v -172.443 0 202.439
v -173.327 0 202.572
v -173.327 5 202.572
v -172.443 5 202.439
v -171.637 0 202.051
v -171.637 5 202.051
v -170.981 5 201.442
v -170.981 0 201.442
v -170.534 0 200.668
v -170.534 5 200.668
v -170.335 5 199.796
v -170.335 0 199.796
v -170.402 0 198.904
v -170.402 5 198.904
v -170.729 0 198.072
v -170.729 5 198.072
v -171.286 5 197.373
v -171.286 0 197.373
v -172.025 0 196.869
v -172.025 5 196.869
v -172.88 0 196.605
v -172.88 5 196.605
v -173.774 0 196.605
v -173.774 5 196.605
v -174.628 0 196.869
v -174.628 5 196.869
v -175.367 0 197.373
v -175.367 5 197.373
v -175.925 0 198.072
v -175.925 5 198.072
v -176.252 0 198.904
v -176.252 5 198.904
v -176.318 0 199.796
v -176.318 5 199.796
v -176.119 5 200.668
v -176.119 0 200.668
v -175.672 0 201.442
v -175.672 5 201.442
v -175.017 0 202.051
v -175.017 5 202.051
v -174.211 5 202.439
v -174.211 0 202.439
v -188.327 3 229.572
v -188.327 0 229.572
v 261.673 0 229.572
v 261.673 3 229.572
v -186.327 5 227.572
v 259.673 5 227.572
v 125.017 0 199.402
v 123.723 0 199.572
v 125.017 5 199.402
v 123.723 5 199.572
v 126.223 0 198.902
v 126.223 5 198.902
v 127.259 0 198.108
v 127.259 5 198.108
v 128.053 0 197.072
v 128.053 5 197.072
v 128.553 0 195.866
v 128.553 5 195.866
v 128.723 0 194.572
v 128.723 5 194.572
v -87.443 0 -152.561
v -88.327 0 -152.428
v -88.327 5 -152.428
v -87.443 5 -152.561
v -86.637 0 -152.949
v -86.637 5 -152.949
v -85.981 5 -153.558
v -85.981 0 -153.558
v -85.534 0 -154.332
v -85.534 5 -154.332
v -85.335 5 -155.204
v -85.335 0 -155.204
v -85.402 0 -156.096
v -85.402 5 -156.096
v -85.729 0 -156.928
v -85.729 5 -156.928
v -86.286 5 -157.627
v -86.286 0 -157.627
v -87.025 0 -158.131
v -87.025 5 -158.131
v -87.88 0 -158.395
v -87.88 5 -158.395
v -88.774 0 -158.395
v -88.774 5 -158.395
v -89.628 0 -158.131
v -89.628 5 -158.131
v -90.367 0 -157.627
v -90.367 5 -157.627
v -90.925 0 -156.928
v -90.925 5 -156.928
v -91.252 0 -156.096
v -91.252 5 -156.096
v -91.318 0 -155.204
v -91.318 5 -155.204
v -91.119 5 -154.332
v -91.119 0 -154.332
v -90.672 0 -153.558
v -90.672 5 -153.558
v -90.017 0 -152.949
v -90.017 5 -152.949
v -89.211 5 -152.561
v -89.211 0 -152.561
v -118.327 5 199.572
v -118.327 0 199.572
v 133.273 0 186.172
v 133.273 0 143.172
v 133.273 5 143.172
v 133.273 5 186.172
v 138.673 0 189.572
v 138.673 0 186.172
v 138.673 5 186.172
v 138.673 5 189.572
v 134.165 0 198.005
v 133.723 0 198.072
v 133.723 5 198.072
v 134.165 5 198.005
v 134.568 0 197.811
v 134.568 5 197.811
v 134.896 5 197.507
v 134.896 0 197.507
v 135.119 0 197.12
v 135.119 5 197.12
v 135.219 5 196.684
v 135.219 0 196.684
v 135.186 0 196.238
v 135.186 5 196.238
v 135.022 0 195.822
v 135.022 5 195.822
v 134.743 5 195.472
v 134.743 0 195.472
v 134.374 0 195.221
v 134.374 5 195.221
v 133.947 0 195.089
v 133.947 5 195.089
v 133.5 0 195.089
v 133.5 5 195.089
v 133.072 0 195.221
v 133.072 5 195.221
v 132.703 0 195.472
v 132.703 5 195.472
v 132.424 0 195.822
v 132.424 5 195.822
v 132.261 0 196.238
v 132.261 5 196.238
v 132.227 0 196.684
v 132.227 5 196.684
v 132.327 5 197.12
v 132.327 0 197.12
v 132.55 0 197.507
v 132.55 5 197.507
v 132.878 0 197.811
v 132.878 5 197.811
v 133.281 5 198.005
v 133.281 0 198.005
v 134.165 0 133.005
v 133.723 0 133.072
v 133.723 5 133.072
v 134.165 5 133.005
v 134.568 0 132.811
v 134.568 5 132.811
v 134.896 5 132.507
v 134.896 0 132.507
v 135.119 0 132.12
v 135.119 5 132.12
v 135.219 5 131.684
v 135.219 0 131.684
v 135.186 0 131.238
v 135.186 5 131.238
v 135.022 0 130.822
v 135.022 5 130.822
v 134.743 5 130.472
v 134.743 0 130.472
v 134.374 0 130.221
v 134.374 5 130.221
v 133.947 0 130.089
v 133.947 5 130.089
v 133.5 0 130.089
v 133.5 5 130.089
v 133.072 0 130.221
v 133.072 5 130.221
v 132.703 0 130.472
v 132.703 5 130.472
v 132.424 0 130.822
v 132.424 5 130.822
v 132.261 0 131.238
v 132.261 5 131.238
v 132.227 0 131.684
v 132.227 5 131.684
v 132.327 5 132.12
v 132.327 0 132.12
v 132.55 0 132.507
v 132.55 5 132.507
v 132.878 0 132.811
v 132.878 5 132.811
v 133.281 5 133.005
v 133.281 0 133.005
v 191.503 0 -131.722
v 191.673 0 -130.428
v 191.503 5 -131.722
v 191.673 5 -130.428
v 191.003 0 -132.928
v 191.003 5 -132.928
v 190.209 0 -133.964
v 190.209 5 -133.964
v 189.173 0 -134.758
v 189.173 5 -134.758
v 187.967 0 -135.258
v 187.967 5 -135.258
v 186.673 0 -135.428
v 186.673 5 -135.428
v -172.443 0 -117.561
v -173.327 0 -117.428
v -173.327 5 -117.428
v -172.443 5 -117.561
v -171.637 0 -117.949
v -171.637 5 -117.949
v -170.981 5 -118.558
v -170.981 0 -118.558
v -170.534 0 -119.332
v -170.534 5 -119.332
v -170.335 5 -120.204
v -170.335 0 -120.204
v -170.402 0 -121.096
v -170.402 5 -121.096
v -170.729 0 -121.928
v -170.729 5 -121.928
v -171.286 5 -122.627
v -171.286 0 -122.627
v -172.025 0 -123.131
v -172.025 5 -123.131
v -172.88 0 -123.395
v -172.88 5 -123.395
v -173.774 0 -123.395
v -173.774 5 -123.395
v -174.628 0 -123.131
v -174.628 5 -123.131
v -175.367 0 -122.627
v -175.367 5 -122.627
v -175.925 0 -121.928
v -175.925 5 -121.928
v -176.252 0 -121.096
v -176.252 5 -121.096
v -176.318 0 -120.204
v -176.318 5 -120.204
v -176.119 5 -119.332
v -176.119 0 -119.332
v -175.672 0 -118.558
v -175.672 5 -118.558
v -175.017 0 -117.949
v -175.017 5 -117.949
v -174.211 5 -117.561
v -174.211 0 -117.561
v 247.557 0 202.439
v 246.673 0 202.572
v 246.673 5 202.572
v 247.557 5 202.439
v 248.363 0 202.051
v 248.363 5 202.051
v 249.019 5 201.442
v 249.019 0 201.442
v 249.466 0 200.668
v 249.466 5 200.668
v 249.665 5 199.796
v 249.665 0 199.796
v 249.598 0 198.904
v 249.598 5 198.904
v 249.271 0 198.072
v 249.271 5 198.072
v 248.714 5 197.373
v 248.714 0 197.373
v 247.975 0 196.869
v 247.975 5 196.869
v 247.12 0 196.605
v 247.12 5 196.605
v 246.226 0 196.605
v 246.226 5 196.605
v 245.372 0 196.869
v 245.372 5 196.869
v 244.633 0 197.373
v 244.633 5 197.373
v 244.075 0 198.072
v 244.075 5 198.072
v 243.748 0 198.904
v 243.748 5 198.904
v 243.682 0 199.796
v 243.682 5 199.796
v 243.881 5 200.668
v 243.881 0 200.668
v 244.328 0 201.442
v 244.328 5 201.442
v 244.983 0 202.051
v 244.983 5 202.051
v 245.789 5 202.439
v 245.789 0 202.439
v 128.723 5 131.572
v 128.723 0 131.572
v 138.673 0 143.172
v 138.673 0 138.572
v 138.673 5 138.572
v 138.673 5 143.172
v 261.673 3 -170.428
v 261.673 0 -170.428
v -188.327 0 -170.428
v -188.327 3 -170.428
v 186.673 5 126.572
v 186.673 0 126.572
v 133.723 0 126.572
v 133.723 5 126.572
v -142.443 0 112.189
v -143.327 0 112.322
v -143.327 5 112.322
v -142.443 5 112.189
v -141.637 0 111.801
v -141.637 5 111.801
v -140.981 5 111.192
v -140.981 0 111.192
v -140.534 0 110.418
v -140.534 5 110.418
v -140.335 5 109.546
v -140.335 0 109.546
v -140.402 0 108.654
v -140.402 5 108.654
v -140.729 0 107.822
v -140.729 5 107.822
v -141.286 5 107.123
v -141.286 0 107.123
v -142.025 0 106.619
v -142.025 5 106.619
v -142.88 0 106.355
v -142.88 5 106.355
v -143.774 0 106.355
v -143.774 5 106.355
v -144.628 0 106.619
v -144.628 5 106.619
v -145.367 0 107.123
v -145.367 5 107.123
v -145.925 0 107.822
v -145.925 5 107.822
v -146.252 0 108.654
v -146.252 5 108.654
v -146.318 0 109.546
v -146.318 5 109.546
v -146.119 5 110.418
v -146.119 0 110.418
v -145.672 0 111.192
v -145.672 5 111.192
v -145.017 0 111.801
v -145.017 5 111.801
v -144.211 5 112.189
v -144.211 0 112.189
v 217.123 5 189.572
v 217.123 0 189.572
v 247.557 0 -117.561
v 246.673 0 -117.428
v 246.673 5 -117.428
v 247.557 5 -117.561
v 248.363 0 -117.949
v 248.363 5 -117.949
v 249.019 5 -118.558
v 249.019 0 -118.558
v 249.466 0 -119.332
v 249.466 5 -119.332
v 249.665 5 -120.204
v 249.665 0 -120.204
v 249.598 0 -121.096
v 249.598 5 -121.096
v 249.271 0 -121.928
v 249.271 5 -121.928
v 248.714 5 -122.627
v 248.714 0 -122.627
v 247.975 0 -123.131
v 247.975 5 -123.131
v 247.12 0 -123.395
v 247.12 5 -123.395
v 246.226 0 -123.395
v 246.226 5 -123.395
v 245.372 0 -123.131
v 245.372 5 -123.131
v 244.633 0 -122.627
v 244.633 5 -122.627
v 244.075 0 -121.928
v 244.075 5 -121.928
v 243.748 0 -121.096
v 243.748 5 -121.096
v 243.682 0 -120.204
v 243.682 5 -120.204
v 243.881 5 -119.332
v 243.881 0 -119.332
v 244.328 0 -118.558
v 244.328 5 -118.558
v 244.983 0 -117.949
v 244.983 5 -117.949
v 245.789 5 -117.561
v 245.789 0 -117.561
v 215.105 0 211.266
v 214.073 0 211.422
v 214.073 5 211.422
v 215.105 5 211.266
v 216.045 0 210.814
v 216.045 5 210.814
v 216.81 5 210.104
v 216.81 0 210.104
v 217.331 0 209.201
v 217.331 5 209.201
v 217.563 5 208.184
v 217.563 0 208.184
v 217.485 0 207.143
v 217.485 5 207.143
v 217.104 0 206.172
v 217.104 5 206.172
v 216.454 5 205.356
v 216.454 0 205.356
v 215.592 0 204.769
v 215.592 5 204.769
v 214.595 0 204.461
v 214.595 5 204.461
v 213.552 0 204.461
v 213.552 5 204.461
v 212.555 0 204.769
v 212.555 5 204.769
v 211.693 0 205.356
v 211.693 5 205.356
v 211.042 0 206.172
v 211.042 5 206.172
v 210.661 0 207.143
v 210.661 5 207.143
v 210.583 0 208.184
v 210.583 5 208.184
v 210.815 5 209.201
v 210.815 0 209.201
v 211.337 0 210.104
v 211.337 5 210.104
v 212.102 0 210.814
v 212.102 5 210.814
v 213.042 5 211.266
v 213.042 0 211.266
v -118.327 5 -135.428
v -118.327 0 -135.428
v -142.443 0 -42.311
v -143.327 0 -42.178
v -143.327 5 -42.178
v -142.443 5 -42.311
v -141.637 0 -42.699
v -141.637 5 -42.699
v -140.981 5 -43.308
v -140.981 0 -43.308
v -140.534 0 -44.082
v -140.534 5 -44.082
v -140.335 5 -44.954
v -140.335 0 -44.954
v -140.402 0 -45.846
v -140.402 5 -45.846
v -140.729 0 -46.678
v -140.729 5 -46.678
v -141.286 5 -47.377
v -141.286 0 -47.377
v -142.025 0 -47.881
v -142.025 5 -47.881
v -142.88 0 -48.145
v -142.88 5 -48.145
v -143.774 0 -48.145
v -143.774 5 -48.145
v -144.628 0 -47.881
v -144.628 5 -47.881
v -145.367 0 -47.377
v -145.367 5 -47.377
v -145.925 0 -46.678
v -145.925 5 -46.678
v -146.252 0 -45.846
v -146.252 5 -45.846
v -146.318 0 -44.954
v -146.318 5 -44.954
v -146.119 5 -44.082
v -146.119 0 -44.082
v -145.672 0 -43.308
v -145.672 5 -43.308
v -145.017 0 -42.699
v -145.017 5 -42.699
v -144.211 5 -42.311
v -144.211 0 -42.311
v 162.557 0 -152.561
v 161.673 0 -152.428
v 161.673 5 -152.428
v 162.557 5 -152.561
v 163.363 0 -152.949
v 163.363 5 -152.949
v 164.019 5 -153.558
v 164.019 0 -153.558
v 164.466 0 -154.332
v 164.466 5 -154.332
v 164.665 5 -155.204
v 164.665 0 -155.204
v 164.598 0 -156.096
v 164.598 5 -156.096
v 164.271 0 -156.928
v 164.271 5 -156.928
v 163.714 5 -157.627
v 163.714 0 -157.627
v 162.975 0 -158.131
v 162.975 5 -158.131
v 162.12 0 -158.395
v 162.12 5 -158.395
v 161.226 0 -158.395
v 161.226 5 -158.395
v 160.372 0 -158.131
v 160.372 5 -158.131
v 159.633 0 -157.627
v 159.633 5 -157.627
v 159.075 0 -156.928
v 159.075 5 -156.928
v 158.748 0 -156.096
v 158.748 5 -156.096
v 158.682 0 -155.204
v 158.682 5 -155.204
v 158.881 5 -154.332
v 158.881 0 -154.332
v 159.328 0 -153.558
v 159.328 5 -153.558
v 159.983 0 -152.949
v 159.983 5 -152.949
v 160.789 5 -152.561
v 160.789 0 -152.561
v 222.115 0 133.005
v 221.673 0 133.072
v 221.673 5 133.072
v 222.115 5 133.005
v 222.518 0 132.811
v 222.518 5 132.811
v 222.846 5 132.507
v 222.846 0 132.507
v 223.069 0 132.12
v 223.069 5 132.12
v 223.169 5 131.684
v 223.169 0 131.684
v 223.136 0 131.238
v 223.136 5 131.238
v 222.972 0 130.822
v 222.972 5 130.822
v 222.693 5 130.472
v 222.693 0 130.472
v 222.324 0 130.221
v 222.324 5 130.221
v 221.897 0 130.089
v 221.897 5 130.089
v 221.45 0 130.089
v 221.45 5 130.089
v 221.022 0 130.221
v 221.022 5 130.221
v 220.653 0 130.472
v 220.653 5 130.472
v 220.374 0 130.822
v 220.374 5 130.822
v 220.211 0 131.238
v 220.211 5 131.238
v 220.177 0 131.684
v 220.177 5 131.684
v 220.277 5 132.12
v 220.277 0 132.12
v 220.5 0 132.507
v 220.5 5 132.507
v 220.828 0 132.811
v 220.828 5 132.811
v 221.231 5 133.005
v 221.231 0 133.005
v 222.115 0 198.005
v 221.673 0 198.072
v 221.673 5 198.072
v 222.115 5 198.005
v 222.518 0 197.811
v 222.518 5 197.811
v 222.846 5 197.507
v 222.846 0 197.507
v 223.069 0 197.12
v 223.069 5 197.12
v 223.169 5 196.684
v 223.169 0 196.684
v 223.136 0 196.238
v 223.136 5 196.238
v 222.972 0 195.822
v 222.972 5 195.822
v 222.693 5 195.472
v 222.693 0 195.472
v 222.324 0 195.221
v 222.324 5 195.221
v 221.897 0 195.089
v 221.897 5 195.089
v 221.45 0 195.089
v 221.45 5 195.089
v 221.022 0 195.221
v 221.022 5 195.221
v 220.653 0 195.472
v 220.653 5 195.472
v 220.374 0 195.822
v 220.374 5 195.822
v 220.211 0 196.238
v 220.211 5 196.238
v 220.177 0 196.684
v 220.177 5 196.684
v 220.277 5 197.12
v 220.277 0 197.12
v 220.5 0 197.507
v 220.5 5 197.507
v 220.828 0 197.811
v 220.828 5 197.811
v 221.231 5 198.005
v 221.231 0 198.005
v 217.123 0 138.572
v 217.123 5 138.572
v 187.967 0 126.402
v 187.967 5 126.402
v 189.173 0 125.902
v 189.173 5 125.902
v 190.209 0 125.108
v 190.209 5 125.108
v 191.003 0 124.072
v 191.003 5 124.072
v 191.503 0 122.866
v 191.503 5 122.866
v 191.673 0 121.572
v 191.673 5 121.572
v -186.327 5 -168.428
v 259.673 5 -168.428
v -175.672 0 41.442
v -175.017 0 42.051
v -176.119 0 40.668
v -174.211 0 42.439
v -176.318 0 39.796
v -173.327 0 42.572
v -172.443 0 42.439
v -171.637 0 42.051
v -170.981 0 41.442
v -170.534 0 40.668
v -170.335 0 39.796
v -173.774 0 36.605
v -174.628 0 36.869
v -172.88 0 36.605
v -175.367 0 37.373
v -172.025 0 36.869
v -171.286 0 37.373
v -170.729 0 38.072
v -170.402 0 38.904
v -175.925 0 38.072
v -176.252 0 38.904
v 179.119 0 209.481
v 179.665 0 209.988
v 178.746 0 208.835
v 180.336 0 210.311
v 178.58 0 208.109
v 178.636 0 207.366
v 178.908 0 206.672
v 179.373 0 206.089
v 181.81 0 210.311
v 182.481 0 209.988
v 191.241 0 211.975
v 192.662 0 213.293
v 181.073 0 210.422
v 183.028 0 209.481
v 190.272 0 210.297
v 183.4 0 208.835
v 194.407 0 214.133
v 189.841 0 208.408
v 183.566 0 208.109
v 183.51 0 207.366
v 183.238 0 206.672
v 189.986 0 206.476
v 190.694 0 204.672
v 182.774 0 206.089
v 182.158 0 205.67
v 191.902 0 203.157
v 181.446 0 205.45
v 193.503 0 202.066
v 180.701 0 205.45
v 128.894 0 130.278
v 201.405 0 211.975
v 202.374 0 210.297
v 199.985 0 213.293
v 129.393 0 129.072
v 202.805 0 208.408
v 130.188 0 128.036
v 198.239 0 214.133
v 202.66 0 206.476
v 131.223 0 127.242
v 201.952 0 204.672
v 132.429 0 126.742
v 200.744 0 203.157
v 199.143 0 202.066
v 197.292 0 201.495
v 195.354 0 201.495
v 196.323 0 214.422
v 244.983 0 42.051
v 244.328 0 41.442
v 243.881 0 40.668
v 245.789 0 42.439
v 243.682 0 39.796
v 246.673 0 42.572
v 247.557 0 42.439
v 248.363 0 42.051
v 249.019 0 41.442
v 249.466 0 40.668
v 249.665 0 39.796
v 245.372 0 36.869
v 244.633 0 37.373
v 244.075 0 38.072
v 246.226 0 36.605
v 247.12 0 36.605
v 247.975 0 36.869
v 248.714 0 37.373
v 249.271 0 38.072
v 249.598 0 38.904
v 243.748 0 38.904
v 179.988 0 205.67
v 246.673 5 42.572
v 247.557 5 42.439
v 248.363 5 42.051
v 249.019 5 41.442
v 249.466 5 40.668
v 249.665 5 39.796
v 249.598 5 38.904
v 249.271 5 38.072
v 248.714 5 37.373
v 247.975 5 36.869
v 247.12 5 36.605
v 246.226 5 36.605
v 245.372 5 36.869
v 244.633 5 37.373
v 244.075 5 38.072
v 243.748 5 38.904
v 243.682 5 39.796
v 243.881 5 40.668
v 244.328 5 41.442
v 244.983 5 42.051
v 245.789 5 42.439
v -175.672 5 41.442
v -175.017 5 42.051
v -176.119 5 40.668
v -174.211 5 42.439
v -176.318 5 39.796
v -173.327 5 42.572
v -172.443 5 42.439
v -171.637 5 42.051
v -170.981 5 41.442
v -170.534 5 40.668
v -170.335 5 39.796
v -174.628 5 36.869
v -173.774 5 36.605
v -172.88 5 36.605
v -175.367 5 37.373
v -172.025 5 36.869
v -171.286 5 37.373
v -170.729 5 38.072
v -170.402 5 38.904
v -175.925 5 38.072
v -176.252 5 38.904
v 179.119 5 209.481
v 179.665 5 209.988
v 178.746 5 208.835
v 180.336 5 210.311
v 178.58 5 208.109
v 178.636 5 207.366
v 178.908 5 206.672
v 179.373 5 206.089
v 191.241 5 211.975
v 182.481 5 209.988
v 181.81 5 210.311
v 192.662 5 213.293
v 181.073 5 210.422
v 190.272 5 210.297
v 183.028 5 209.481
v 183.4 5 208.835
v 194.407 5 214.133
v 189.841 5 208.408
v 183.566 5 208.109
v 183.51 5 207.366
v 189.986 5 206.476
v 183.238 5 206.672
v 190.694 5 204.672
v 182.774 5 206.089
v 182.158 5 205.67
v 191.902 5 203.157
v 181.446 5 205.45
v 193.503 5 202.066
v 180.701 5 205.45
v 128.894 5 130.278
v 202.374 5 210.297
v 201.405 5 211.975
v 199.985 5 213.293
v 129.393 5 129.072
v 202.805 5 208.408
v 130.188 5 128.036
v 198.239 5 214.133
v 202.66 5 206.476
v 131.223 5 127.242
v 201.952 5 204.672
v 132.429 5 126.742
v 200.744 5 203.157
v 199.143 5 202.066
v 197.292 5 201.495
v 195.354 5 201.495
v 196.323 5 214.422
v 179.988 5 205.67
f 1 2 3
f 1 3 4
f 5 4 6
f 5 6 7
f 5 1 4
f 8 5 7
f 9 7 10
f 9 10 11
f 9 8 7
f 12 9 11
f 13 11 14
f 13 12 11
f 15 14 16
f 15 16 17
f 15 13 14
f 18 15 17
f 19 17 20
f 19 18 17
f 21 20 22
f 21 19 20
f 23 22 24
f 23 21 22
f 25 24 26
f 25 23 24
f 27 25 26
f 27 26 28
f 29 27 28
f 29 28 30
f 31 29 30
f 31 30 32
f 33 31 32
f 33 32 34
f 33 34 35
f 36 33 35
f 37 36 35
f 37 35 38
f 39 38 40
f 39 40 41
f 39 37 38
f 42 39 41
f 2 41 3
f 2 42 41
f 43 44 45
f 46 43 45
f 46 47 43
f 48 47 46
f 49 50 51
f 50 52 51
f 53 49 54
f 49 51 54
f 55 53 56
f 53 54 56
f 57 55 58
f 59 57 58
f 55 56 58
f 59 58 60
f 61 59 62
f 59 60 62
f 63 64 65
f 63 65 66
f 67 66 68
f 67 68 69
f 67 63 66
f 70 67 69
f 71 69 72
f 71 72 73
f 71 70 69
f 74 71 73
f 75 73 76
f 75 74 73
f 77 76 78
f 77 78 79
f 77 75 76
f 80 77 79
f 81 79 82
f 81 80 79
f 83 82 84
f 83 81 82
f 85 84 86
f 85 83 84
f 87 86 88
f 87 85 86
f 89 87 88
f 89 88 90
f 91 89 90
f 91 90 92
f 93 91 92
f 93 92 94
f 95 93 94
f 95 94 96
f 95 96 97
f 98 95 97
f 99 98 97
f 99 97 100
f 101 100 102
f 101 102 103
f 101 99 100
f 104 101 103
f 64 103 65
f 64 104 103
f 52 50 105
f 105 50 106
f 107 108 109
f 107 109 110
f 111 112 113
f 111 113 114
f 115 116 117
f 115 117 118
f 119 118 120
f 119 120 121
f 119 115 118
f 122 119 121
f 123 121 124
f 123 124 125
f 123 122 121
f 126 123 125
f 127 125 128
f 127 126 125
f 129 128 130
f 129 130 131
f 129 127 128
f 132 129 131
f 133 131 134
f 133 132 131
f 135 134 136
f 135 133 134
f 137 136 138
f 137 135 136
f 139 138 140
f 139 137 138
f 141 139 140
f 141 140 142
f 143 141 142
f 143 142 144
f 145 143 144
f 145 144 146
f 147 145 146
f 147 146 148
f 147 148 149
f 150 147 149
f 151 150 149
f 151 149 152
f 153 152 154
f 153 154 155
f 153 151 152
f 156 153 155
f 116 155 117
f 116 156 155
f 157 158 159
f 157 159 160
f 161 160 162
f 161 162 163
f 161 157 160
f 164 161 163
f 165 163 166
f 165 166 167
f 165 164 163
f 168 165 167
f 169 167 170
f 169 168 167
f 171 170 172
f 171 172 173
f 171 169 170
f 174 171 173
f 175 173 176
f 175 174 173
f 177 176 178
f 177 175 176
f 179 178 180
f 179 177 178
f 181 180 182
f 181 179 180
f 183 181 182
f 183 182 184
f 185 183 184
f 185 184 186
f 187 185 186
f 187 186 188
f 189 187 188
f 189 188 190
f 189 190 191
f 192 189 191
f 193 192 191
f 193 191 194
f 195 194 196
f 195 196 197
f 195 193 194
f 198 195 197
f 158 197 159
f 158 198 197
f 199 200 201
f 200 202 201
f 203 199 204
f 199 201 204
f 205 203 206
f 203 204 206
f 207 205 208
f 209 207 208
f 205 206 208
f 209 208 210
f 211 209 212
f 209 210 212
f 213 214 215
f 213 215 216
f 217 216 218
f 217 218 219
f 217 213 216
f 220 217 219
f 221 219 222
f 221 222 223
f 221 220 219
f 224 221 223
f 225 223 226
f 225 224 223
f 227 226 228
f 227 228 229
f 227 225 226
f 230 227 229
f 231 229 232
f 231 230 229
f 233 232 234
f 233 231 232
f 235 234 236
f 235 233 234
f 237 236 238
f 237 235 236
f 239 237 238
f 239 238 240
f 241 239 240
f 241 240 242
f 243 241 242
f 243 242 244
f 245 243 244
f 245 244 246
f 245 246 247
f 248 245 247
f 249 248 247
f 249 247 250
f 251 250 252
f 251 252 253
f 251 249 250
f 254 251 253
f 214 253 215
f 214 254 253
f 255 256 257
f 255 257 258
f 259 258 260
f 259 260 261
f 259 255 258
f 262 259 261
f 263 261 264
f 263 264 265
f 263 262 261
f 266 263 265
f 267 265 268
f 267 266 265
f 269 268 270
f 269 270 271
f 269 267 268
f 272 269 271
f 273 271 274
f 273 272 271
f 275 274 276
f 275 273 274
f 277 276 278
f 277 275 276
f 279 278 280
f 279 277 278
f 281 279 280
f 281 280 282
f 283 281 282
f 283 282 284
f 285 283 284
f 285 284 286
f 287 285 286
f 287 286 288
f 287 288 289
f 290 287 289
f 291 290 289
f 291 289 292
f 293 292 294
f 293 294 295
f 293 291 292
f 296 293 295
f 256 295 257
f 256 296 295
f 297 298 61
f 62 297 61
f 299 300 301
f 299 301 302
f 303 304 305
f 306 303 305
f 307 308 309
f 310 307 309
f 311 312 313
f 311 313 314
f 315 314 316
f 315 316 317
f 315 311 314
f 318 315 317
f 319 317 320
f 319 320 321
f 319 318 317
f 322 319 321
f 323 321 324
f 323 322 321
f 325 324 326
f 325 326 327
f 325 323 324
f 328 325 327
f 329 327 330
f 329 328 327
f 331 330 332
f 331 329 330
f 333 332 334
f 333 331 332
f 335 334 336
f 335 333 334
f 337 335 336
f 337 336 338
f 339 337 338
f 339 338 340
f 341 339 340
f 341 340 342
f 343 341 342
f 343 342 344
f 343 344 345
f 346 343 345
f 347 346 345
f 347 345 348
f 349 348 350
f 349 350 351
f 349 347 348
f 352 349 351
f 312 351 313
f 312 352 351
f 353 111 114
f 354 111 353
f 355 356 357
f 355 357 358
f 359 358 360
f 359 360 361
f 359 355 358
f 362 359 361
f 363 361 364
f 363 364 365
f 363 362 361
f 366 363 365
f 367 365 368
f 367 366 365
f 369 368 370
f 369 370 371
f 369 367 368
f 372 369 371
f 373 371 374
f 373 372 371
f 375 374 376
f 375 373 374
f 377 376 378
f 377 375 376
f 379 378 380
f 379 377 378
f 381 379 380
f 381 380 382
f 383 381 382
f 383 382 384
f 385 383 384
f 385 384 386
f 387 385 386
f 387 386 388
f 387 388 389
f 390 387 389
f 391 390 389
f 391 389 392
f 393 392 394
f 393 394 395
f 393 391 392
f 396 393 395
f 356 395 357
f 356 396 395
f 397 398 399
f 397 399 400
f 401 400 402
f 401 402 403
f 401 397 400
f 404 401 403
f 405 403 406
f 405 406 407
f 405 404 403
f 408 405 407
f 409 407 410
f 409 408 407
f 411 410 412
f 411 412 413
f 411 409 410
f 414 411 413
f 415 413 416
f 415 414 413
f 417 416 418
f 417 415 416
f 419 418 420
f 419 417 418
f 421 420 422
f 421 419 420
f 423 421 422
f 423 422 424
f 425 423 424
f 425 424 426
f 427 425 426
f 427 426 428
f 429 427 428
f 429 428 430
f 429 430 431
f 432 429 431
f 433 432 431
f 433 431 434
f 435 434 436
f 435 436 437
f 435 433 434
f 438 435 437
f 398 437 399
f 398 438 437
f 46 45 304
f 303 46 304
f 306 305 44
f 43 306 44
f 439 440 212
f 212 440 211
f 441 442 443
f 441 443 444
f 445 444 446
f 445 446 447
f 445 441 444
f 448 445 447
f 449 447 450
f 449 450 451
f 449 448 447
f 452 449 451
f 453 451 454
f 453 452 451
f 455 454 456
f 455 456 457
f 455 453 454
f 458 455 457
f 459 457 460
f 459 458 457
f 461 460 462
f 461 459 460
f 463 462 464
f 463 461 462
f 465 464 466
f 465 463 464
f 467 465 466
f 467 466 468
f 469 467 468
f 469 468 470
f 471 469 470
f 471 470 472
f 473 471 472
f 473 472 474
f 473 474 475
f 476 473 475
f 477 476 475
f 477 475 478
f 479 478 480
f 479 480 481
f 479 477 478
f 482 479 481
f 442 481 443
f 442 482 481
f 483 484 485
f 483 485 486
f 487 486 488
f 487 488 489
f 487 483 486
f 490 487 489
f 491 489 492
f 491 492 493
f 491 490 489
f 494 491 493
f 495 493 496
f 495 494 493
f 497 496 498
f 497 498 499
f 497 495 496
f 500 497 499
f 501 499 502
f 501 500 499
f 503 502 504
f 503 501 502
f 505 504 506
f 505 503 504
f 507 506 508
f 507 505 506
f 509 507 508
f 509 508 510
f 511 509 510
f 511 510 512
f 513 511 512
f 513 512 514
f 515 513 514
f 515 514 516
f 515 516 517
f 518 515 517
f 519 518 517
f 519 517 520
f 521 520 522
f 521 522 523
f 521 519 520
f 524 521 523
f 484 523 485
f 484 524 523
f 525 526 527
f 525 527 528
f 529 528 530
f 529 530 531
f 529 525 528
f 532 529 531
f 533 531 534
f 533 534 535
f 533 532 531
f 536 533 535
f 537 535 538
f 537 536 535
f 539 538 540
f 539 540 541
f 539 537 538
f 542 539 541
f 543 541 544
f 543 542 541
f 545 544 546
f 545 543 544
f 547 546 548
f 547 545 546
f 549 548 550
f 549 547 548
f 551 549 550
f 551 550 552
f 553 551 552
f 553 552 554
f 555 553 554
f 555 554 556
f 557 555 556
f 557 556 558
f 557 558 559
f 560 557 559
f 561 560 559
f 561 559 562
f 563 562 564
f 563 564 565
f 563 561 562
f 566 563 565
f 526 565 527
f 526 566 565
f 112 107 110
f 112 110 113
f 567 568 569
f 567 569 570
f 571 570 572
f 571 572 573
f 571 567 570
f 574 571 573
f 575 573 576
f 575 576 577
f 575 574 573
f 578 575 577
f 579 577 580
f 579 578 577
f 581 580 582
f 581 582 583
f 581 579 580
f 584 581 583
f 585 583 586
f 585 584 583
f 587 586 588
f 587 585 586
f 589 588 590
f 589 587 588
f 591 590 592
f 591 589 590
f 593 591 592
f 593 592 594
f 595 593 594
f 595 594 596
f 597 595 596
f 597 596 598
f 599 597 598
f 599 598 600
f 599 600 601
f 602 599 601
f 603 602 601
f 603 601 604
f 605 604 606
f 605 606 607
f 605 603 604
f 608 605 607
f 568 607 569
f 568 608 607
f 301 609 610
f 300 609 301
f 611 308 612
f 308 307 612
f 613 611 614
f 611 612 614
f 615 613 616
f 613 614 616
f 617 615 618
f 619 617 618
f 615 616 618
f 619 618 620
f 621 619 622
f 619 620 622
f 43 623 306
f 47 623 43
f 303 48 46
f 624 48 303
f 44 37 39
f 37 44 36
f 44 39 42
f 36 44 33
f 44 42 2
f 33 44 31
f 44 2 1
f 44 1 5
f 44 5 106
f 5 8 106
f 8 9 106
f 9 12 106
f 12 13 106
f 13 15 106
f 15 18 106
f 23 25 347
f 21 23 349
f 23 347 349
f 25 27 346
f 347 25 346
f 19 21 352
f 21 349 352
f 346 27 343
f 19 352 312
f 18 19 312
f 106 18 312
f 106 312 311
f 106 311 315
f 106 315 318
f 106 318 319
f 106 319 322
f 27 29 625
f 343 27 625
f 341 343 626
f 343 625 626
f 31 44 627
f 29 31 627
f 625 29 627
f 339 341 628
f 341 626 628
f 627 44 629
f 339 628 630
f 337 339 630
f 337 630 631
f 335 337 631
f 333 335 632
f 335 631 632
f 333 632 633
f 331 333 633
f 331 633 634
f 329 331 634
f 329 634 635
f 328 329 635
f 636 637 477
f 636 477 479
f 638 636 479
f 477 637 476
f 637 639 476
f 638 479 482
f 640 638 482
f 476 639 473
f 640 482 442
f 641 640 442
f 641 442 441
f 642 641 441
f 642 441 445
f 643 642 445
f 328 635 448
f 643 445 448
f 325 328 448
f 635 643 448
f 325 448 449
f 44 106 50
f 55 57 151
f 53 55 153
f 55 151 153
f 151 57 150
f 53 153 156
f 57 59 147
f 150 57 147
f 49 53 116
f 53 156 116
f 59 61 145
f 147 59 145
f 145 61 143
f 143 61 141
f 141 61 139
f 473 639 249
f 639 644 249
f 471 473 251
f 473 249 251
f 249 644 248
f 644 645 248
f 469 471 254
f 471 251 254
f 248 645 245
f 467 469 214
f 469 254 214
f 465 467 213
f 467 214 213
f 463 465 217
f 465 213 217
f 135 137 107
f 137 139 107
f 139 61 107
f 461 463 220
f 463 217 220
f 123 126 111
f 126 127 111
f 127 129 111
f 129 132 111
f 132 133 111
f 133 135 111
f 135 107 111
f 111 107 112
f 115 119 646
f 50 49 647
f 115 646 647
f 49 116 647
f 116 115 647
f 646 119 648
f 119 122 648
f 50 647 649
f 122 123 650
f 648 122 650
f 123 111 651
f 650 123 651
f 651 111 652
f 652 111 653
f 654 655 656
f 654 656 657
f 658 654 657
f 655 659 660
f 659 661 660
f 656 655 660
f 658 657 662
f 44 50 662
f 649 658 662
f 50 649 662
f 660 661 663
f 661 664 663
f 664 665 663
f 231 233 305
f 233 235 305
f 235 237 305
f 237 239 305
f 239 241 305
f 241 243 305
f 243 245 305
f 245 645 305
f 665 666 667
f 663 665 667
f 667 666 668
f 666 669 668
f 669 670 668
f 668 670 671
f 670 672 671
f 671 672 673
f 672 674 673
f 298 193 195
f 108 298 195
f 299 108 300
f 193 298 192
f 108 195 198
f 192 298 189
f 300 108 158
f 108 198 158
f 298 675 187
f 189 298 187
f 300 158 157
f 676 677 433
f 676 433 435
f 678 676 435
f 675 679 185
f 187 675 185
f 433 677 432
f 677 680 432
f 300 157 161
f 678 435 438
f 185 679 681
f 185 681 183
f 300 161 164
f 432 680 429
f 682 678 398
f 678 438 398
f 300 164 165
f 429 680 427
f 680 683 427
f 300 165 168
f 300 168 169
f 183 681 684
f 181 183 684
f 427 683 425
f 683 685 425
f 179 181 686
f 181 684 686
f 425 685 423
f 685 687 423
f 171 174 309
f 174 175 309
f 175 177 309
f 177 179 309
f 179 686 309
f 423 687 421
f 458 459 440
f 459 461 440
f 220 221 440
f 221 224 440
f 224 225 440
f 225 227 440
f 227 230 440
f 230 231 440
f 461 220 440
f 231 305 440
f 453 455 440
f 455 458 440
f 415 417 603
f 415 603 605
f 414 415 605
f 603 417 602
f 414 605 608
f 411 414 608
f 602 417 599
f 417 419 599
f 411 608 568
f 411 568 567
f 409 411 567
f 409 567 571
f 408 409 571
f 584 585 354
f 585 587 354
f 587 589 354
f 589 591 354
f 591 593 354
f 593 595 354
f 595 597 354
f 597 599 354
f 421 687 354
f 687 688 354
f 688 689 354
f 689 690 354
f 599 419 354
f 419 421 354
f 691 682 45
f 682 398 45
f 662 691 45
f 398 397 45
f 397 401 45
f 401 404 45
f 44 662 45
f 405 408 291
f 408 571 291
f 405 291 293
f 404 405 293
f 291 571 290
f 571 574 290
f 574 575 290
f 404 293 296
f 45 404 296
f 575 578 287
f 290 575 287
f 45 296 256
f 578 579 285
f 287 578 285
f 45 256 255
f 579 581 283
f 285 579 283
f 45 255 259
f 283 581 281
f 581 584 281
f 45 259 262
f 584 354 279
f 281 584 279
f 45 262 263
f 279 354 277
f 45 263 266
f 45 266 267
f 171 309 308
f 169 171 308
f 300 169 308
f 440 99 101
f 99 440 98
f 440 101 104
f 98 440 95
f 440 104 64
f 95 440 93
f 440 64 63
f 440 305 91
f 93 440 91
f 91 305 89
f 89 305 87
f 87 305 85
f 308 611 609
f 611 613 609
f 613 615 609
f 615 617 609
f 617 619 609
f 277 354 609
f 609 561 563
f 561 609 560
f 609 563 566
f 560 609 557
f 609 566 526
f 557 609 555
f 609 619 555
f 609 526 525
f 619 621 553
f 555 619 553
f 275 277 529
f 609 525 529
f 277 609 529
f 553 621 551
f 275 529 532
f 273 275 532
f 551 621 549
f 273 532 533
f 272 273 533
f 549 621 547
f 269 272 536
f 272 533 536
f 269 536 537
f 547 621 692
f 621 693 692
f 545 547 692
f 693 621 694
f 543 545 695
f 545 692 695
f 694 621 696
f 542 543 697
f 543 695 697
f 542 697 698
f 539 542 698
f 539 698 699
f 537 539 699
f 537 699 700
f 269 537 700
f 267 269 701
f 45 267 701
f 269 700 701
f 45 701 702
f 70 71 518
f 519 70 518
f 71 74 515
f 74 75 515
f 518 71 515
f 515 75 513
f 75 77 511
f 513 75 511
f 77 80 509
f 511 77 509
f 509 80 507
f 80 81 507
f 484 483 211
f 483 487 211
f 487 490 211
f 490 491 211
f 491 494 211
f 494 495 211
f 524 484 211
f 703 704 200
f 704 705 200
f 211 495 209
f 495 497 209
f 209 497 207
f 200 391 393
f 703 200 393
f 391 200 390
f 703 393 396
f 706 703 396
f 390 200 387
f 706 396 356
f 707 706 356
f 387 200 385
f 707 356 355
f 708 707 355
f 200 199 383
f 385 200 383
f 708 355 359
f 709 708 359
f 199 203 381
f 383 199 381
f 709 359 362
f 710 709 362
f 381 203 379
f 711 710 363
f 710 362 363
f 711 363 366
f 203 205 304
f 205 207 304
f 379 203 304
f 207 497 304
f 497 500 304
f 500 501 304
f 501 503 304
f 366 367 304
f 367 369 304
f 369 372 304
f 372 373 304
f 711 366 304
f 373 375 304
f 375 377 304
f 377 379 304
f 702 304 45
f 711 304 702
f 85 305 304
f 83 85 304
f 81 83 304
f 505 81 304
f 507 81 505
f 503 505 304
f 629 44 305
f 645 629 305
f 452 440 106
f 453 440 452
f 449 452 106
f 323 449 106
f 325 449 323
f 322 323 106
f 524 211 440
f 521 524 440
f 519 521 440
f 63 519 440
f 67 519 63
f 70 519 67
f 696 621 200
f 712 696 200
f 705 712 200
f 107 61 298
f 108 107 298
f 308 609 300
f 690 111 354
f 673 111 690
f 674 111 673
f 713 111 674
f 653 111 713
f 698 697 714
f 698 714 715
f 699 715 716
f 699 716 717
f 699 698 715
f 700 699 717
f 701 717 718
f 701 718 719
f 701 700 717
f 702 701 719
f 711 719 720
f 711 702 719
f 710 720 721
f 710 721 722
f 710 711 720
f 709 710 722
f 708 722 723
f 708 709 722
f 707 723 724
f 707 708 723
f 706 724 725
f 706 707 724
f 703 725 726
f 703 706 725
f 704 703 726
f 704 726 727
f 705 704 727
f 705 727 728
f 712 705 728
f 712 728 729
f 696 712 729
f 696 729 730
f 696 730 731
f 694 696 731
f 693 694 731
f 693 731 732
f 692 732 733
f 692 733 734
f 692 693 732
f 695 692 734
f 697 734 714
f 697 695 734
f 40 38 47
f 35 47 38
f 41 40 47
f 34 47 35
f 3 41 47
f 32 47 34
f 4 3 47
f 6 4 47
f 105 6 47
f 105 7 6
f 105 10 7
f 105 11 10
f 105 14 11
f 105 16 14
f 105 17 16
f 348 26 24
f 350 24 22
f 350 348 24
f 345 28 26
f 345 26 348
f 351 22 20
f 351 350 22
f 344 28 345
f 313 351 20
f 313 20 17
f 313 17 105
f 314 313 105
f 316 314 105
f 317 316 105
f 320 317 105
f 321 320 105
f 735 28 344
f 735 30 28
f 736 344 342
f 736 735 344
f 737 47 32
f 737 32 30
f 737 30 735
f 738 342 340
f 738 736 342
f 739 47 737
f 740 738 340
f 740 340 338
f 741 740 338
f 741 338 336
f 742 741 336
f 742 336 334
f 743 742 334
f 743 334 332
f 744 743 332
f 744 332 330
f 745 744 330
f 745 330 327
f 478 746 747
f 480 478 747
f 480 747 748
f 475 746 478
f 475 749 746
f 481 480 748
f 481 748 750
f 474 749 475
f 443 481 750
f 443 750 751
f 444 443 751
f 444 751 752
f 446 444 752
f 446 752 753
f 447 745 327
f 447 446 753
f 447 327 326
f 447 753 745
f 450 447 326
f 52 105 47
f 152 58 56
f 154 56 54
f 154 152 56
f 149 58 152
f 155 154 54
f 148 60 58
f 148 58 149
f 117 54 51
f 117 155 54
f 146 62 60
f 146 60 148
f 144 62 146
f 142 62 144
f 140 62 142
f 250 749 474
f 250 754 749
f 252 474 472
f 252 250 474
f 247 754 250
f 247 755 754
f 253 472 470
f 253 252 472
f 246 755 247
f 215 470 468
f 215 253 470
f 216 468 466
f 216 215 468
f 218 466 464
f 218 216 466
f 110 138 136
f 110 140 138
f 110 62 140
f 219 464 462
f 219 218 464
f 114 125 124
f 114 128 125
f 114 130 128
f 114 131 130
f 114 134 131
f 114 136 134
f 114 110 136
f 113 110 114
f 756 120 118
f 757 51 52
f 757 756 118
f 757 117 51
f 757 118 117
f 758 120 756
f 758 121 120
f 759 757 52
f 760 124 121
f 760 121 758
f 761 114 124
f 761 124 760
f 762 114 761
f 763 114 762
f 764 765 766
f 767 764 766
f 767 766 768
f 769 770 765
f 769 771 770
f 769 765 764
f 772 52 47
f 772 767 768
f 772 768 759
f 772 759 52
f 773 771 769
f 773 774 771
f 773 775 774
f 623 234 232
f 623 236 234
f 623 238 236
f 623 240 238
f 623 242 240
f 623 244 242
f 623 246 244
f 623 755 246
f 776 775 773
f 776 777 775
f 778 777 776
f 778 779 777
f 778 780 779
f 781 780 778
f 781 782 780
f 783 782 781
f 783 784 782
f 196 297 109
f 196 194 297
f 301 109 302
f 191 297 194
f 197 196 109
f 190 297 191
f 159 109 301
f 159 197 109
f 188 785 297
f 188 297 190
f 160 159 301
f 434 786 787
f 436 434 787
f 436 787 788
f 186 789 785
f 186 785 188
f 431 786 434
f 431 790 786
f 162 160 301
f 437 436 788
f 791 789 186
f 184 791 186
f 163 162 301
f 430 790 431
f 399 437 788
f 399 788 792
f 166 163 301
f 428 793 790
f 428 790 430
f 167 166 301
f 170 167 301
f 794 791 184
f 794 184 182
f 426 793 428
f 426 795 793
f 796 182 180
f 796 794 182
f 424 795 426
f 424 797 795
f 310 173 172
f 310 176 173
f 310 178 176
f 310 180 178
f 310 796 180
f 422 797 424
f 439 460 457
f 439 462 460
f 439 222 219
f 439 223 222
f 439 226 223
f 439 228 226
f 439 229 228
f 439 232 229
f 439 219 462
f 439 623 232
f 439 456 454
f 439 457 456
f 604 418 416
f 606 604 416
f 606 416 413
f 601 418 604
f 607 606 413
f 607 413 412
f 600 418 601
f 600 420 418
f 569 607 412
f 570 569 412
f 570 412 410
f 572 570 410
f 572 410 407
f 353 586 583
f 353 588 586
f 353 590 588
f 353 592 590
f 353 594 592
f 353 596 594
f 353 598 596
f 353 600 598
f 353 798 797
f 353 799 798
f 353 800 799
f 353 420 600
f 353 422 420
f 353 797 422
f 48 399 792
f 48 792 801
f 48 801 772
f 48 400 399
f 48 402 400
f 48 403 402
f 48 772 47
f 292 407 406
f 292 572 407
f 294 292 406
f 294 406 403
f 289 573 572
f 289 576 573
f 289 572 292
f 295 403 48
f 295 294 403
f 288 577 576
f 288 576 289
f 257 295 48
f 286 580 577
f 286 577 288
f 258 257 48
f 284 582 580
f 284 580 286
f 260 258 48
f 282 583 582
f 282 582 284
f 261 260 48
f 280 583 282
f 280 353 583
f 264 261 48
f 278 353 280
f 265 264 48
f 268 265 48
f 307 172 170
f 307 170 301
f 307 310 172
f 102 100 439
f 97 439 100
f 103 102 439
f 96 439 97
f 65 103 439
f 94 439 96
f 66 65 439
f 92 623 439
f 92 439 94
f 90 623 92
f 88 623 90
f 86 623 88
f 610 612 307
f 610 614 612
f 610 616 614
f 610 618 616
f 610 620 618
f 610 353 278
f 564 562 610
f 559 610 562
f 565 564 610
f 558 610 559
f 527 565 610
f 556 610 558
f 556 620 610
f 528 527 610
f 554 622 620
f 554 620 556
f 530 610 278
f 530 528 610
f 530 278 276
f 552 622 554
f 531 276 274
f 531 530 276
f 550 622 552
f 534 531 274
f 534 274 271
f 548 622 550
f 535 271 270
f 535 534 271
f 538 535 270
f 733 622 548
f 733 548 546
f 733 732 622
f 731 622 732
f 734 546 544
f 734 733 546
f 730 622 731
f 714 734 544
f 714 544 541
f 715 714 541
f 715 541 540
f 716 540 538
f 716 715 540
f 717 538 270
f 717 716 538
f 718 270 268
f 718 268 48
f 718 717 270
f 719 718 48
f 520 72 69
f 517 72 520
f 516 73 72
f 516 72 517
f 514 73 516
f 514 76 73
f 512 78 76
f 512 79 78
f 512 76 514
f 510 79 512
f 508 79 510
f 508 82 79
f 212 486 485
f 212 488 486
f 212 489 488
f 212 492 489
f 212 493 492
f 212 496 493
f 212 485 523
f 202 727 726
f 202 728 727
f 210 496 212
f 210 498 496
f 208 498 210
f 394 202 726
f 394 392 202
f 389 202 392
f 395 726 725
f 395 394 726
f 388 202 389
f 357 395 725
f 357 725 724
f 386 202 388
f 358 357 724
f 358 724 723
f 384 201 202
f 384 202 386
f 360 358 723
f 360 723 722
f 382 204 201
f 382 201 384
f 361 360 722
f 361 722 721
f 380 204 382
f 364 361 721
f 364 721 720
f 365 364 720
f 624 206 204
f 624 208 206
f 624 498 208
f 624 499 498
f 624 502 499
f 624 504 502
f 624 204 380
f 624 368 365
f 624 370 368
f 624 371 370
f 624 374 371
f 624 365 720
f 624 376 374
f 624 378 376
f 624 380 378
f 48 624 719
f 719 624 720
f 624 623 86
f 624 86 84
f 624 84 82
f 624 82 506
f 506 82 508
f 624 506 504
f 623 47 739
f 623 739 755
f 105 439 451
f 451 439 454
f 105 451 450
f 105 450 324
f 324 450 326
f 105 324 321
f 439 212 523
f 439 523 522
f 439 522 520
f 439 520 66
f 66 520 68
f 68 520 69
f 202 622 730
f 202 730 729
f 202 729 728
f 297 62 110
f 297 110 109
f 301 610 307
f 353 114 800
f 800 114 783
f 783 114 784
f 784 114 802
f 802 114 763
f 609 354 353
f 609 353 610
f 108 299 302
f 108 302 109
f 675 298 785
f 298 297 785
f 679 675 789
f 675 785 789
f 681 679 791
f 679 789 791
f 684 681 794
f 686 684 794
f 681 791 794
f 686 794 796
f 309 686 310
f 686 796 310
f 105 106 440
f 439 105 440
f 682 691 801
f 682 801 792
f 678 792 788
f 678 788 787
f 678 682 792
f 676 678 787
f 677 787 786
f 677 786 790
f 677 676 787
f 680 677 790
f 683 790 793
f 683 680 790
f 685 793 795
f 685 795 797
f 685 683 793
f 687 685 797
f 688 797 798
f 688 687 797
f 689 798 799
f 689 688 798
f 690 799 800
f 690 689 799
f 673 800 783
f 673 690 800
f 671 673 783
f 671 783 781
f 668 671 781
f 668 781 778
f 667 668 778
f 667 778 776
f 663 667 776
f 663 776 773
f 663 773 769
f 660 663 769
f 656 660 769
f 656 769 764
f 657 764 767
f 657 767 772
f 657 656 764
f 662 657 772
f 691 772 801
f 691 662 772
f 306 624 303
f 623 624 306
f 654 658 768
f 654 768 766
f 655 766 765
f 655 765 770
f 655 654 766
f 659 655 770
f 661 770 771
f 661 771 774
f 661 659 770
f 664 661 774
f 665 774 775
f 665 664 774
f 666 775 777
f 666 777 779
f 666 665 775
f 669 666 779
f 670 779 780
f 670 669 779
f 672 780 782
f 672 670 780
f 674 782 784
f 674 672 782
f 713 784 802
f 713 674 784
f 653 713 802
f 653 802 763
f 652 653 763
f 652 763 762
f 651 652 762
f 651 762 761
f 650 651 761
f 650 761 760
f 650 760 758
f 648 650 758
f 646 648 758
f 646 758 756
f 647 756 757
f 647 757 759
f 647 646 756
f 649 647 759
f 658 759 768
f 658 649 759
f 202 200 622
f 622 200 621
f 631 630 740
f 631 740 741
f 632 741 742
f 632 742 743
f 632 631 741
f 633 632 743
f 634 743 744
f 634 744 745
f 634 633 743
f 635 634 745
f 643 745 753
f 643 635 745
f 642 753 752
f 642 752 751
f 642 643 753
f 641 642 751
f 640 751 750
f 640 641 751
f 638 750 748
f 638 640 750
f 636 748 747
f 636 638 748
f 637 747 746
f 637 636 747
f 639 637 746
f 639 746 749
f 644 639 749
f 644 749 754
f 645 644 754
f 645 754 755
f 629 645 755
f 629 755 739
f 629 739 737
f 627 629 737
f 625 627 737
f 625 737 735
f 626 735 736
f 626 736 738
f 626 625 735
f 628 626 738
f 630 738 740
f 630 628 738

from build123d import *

# Parameters (mm, degrees)
CROQUIS1_R              = 3
CROQUIS1_R_2            = 1.5
CROQUIS1_R_3            = 6.5
CROQUIS1_R_4            = 3.5
CROQUIS1_R_5            = 2.5
SALIENTE_EXTRUIR1_DEPTH = 5
CHAFL_N1_SIZE           = 2
REDONDEO1_R             = 5


with BuildPart() as part:
    # Croquis1 → Saliente-Extruir1 (new body)
    with BuildSketch(Plane(origin=(0, 0, 0), x_dir=(1, 0, 0), z_dir=(0, 1, 0))):
        Polygon((191.673151751, -229.571984436), (261.673151751, -229.571984436), (261.673151751, 170.428015564), (-188.326848249, 170.428015564), (-188.326848249, -229.571984436), (-118.326848249, -229.571984436), align=None)
        with Locations(Location((-173.326848249, 120.428015564, 0), (0, 0, 270))):
            Circle(CROQUIS1_R, mode=Mode.SUBTRACT)
        with Locations(Location((-173.326848249, -199.571984436, 0), (0, 0, 270))):
            Circle(CROQUIS1_R, mode=Mode.SUBTRACT)
        with Locations(Location((246.673151751, -199.571984436, 0), (0, 0, 270))):
            Circle(CROQUIS1_R, mode=Mode.SUBTRACT)
        with Locations(Location((246.673151751, 120.428015564, 0), (0, 0, 270))):
            Circle(CROQUIS1_R, mode=Mode.SUBTRACT)
        with Locations(Location((-173.326848249, -39.571984436, 0), (0, 0, 270))):
            Circle(CROQUIS1_R, mode=Mode.SUBTRACT)
        with Locations(Location((246.673151751, -39.571984436, 0), (0, 0, 270))):
            Circle(CROQUIS1_R, mode=Mode.SUBTRACT)
        with Locations(Location((-88.326848249, 155.428015564, 0), (0, 0, 270))):
            Circle(CROQUIS1_R, mode=Mode.SUBTRACT)
        with Locations(Location((161.673151751, 155.428015564, 0), (0, 0, 270))):
            Circle(CROQUIS1_R, mode=Mode.SUBTRACT)
        with Locations(Location((133.723151751, -131.571984436, 0), (0, 0, 270))):
            Circle(CROQUIS1_R_2, mode=Mode.SUBTRACT)
        with Locations(Location((133.723151751, -196.571984436, 0), (0, 0, 270))):
            Circle(CROQUIS1_R_2, mode=Mode.SUBTRACT)
        with Locations(Location((221.673151751, -196.571984436, 0), (0, 0, 270))):
            Circle(CROQUIS1_R_2, mode=Mode.SUBTRACT)
        with Locations(Location((221.673151751, -131.571984436, 0), (0, 0, 270))):
            Circle(CROQUIS1_R_2, mode=Mode.SUBTRACT)
        with Locations(Location((196.323151751, -207.921984436, 0), (0, 0, 270))):
            Circle(CROQUIS1_R_3, mode=Mode.SUBTRACT)
        with Locations(Location((214.073151751, -207.921984436, 0), (0, 0, 270))):
            Circle(CROQUIS1_R_4, mode=Mode.SUBTRACT)
        with Locations(Location((181.073151751, -207.921984436, 0), (0, 0, 270))):
            Circle(CROQUIS1_R_5, mode=Mode.SUBTRACT)
        with Locations(Location((-143.326848249, 45.178015564, 0), (0, 0, 270))):
            Circle(CROQUIS1_R, mode=Mode.SUBTRACT)
        with Locations(Location((-143.326848249, -109.321984436, 0), (0, 0, 270))):
            Circle(CROQUIS1_R, mode=Mode.SUBTRACT)
        Polygon((138.673151751, -186.171984436), (138.673151751, -189.571984436), (217.123151751, -189.571984436), (217.123151751, -138.571984436), (138.673151751, -138.571984436), (138.673151751, -143.171984436), (133.273151751, -143.171984436), (133.273151751, -186.171984436), align=None, mode=Mode.SUBTRACT)
        Polygon((-118.326848249, -199.571984436), (-118.326848249, 135.428015564), (191.673151751, 135.428015564), (191.673151751, -126.571984436), (128.723151751, -126.571984436), (128.723151751, -199.571984436), align=None, mode=Mode.SUBTRACT)
    extrude(amount=SALIENTE_EXTRUIR1_DEPTH)

    # Chaflán1
    chafl_n1_edges = [part.edges().sort_by_distance(p)[0] for p in [
        (261.673151751, 5, 29.571984436),
        (36.673151751, 5, -170.428015564),
        (-188.326848249, 5, 29.571984436),
        (36.673151751, 5, 229.571984436),
    ]]
    chamfer(chafl_n1_edges, length=CHAFL_N1_SIZE)

    # Redondeo1
    redondeo1_edges = [part.edges().sort_by_distance(p)[0] for p in [
        (191.673151751, 2.5, 126.571984436),
        (191.673151751, 2.5, -135.428015564),
        (128.723151751, 2.5, 199.571984436),
        (128.723151751, 2.5, 126.571984436),
    ]]
    fillet(redondeo1_edges, radius=REDONDEO1_R)


solid = part.part
